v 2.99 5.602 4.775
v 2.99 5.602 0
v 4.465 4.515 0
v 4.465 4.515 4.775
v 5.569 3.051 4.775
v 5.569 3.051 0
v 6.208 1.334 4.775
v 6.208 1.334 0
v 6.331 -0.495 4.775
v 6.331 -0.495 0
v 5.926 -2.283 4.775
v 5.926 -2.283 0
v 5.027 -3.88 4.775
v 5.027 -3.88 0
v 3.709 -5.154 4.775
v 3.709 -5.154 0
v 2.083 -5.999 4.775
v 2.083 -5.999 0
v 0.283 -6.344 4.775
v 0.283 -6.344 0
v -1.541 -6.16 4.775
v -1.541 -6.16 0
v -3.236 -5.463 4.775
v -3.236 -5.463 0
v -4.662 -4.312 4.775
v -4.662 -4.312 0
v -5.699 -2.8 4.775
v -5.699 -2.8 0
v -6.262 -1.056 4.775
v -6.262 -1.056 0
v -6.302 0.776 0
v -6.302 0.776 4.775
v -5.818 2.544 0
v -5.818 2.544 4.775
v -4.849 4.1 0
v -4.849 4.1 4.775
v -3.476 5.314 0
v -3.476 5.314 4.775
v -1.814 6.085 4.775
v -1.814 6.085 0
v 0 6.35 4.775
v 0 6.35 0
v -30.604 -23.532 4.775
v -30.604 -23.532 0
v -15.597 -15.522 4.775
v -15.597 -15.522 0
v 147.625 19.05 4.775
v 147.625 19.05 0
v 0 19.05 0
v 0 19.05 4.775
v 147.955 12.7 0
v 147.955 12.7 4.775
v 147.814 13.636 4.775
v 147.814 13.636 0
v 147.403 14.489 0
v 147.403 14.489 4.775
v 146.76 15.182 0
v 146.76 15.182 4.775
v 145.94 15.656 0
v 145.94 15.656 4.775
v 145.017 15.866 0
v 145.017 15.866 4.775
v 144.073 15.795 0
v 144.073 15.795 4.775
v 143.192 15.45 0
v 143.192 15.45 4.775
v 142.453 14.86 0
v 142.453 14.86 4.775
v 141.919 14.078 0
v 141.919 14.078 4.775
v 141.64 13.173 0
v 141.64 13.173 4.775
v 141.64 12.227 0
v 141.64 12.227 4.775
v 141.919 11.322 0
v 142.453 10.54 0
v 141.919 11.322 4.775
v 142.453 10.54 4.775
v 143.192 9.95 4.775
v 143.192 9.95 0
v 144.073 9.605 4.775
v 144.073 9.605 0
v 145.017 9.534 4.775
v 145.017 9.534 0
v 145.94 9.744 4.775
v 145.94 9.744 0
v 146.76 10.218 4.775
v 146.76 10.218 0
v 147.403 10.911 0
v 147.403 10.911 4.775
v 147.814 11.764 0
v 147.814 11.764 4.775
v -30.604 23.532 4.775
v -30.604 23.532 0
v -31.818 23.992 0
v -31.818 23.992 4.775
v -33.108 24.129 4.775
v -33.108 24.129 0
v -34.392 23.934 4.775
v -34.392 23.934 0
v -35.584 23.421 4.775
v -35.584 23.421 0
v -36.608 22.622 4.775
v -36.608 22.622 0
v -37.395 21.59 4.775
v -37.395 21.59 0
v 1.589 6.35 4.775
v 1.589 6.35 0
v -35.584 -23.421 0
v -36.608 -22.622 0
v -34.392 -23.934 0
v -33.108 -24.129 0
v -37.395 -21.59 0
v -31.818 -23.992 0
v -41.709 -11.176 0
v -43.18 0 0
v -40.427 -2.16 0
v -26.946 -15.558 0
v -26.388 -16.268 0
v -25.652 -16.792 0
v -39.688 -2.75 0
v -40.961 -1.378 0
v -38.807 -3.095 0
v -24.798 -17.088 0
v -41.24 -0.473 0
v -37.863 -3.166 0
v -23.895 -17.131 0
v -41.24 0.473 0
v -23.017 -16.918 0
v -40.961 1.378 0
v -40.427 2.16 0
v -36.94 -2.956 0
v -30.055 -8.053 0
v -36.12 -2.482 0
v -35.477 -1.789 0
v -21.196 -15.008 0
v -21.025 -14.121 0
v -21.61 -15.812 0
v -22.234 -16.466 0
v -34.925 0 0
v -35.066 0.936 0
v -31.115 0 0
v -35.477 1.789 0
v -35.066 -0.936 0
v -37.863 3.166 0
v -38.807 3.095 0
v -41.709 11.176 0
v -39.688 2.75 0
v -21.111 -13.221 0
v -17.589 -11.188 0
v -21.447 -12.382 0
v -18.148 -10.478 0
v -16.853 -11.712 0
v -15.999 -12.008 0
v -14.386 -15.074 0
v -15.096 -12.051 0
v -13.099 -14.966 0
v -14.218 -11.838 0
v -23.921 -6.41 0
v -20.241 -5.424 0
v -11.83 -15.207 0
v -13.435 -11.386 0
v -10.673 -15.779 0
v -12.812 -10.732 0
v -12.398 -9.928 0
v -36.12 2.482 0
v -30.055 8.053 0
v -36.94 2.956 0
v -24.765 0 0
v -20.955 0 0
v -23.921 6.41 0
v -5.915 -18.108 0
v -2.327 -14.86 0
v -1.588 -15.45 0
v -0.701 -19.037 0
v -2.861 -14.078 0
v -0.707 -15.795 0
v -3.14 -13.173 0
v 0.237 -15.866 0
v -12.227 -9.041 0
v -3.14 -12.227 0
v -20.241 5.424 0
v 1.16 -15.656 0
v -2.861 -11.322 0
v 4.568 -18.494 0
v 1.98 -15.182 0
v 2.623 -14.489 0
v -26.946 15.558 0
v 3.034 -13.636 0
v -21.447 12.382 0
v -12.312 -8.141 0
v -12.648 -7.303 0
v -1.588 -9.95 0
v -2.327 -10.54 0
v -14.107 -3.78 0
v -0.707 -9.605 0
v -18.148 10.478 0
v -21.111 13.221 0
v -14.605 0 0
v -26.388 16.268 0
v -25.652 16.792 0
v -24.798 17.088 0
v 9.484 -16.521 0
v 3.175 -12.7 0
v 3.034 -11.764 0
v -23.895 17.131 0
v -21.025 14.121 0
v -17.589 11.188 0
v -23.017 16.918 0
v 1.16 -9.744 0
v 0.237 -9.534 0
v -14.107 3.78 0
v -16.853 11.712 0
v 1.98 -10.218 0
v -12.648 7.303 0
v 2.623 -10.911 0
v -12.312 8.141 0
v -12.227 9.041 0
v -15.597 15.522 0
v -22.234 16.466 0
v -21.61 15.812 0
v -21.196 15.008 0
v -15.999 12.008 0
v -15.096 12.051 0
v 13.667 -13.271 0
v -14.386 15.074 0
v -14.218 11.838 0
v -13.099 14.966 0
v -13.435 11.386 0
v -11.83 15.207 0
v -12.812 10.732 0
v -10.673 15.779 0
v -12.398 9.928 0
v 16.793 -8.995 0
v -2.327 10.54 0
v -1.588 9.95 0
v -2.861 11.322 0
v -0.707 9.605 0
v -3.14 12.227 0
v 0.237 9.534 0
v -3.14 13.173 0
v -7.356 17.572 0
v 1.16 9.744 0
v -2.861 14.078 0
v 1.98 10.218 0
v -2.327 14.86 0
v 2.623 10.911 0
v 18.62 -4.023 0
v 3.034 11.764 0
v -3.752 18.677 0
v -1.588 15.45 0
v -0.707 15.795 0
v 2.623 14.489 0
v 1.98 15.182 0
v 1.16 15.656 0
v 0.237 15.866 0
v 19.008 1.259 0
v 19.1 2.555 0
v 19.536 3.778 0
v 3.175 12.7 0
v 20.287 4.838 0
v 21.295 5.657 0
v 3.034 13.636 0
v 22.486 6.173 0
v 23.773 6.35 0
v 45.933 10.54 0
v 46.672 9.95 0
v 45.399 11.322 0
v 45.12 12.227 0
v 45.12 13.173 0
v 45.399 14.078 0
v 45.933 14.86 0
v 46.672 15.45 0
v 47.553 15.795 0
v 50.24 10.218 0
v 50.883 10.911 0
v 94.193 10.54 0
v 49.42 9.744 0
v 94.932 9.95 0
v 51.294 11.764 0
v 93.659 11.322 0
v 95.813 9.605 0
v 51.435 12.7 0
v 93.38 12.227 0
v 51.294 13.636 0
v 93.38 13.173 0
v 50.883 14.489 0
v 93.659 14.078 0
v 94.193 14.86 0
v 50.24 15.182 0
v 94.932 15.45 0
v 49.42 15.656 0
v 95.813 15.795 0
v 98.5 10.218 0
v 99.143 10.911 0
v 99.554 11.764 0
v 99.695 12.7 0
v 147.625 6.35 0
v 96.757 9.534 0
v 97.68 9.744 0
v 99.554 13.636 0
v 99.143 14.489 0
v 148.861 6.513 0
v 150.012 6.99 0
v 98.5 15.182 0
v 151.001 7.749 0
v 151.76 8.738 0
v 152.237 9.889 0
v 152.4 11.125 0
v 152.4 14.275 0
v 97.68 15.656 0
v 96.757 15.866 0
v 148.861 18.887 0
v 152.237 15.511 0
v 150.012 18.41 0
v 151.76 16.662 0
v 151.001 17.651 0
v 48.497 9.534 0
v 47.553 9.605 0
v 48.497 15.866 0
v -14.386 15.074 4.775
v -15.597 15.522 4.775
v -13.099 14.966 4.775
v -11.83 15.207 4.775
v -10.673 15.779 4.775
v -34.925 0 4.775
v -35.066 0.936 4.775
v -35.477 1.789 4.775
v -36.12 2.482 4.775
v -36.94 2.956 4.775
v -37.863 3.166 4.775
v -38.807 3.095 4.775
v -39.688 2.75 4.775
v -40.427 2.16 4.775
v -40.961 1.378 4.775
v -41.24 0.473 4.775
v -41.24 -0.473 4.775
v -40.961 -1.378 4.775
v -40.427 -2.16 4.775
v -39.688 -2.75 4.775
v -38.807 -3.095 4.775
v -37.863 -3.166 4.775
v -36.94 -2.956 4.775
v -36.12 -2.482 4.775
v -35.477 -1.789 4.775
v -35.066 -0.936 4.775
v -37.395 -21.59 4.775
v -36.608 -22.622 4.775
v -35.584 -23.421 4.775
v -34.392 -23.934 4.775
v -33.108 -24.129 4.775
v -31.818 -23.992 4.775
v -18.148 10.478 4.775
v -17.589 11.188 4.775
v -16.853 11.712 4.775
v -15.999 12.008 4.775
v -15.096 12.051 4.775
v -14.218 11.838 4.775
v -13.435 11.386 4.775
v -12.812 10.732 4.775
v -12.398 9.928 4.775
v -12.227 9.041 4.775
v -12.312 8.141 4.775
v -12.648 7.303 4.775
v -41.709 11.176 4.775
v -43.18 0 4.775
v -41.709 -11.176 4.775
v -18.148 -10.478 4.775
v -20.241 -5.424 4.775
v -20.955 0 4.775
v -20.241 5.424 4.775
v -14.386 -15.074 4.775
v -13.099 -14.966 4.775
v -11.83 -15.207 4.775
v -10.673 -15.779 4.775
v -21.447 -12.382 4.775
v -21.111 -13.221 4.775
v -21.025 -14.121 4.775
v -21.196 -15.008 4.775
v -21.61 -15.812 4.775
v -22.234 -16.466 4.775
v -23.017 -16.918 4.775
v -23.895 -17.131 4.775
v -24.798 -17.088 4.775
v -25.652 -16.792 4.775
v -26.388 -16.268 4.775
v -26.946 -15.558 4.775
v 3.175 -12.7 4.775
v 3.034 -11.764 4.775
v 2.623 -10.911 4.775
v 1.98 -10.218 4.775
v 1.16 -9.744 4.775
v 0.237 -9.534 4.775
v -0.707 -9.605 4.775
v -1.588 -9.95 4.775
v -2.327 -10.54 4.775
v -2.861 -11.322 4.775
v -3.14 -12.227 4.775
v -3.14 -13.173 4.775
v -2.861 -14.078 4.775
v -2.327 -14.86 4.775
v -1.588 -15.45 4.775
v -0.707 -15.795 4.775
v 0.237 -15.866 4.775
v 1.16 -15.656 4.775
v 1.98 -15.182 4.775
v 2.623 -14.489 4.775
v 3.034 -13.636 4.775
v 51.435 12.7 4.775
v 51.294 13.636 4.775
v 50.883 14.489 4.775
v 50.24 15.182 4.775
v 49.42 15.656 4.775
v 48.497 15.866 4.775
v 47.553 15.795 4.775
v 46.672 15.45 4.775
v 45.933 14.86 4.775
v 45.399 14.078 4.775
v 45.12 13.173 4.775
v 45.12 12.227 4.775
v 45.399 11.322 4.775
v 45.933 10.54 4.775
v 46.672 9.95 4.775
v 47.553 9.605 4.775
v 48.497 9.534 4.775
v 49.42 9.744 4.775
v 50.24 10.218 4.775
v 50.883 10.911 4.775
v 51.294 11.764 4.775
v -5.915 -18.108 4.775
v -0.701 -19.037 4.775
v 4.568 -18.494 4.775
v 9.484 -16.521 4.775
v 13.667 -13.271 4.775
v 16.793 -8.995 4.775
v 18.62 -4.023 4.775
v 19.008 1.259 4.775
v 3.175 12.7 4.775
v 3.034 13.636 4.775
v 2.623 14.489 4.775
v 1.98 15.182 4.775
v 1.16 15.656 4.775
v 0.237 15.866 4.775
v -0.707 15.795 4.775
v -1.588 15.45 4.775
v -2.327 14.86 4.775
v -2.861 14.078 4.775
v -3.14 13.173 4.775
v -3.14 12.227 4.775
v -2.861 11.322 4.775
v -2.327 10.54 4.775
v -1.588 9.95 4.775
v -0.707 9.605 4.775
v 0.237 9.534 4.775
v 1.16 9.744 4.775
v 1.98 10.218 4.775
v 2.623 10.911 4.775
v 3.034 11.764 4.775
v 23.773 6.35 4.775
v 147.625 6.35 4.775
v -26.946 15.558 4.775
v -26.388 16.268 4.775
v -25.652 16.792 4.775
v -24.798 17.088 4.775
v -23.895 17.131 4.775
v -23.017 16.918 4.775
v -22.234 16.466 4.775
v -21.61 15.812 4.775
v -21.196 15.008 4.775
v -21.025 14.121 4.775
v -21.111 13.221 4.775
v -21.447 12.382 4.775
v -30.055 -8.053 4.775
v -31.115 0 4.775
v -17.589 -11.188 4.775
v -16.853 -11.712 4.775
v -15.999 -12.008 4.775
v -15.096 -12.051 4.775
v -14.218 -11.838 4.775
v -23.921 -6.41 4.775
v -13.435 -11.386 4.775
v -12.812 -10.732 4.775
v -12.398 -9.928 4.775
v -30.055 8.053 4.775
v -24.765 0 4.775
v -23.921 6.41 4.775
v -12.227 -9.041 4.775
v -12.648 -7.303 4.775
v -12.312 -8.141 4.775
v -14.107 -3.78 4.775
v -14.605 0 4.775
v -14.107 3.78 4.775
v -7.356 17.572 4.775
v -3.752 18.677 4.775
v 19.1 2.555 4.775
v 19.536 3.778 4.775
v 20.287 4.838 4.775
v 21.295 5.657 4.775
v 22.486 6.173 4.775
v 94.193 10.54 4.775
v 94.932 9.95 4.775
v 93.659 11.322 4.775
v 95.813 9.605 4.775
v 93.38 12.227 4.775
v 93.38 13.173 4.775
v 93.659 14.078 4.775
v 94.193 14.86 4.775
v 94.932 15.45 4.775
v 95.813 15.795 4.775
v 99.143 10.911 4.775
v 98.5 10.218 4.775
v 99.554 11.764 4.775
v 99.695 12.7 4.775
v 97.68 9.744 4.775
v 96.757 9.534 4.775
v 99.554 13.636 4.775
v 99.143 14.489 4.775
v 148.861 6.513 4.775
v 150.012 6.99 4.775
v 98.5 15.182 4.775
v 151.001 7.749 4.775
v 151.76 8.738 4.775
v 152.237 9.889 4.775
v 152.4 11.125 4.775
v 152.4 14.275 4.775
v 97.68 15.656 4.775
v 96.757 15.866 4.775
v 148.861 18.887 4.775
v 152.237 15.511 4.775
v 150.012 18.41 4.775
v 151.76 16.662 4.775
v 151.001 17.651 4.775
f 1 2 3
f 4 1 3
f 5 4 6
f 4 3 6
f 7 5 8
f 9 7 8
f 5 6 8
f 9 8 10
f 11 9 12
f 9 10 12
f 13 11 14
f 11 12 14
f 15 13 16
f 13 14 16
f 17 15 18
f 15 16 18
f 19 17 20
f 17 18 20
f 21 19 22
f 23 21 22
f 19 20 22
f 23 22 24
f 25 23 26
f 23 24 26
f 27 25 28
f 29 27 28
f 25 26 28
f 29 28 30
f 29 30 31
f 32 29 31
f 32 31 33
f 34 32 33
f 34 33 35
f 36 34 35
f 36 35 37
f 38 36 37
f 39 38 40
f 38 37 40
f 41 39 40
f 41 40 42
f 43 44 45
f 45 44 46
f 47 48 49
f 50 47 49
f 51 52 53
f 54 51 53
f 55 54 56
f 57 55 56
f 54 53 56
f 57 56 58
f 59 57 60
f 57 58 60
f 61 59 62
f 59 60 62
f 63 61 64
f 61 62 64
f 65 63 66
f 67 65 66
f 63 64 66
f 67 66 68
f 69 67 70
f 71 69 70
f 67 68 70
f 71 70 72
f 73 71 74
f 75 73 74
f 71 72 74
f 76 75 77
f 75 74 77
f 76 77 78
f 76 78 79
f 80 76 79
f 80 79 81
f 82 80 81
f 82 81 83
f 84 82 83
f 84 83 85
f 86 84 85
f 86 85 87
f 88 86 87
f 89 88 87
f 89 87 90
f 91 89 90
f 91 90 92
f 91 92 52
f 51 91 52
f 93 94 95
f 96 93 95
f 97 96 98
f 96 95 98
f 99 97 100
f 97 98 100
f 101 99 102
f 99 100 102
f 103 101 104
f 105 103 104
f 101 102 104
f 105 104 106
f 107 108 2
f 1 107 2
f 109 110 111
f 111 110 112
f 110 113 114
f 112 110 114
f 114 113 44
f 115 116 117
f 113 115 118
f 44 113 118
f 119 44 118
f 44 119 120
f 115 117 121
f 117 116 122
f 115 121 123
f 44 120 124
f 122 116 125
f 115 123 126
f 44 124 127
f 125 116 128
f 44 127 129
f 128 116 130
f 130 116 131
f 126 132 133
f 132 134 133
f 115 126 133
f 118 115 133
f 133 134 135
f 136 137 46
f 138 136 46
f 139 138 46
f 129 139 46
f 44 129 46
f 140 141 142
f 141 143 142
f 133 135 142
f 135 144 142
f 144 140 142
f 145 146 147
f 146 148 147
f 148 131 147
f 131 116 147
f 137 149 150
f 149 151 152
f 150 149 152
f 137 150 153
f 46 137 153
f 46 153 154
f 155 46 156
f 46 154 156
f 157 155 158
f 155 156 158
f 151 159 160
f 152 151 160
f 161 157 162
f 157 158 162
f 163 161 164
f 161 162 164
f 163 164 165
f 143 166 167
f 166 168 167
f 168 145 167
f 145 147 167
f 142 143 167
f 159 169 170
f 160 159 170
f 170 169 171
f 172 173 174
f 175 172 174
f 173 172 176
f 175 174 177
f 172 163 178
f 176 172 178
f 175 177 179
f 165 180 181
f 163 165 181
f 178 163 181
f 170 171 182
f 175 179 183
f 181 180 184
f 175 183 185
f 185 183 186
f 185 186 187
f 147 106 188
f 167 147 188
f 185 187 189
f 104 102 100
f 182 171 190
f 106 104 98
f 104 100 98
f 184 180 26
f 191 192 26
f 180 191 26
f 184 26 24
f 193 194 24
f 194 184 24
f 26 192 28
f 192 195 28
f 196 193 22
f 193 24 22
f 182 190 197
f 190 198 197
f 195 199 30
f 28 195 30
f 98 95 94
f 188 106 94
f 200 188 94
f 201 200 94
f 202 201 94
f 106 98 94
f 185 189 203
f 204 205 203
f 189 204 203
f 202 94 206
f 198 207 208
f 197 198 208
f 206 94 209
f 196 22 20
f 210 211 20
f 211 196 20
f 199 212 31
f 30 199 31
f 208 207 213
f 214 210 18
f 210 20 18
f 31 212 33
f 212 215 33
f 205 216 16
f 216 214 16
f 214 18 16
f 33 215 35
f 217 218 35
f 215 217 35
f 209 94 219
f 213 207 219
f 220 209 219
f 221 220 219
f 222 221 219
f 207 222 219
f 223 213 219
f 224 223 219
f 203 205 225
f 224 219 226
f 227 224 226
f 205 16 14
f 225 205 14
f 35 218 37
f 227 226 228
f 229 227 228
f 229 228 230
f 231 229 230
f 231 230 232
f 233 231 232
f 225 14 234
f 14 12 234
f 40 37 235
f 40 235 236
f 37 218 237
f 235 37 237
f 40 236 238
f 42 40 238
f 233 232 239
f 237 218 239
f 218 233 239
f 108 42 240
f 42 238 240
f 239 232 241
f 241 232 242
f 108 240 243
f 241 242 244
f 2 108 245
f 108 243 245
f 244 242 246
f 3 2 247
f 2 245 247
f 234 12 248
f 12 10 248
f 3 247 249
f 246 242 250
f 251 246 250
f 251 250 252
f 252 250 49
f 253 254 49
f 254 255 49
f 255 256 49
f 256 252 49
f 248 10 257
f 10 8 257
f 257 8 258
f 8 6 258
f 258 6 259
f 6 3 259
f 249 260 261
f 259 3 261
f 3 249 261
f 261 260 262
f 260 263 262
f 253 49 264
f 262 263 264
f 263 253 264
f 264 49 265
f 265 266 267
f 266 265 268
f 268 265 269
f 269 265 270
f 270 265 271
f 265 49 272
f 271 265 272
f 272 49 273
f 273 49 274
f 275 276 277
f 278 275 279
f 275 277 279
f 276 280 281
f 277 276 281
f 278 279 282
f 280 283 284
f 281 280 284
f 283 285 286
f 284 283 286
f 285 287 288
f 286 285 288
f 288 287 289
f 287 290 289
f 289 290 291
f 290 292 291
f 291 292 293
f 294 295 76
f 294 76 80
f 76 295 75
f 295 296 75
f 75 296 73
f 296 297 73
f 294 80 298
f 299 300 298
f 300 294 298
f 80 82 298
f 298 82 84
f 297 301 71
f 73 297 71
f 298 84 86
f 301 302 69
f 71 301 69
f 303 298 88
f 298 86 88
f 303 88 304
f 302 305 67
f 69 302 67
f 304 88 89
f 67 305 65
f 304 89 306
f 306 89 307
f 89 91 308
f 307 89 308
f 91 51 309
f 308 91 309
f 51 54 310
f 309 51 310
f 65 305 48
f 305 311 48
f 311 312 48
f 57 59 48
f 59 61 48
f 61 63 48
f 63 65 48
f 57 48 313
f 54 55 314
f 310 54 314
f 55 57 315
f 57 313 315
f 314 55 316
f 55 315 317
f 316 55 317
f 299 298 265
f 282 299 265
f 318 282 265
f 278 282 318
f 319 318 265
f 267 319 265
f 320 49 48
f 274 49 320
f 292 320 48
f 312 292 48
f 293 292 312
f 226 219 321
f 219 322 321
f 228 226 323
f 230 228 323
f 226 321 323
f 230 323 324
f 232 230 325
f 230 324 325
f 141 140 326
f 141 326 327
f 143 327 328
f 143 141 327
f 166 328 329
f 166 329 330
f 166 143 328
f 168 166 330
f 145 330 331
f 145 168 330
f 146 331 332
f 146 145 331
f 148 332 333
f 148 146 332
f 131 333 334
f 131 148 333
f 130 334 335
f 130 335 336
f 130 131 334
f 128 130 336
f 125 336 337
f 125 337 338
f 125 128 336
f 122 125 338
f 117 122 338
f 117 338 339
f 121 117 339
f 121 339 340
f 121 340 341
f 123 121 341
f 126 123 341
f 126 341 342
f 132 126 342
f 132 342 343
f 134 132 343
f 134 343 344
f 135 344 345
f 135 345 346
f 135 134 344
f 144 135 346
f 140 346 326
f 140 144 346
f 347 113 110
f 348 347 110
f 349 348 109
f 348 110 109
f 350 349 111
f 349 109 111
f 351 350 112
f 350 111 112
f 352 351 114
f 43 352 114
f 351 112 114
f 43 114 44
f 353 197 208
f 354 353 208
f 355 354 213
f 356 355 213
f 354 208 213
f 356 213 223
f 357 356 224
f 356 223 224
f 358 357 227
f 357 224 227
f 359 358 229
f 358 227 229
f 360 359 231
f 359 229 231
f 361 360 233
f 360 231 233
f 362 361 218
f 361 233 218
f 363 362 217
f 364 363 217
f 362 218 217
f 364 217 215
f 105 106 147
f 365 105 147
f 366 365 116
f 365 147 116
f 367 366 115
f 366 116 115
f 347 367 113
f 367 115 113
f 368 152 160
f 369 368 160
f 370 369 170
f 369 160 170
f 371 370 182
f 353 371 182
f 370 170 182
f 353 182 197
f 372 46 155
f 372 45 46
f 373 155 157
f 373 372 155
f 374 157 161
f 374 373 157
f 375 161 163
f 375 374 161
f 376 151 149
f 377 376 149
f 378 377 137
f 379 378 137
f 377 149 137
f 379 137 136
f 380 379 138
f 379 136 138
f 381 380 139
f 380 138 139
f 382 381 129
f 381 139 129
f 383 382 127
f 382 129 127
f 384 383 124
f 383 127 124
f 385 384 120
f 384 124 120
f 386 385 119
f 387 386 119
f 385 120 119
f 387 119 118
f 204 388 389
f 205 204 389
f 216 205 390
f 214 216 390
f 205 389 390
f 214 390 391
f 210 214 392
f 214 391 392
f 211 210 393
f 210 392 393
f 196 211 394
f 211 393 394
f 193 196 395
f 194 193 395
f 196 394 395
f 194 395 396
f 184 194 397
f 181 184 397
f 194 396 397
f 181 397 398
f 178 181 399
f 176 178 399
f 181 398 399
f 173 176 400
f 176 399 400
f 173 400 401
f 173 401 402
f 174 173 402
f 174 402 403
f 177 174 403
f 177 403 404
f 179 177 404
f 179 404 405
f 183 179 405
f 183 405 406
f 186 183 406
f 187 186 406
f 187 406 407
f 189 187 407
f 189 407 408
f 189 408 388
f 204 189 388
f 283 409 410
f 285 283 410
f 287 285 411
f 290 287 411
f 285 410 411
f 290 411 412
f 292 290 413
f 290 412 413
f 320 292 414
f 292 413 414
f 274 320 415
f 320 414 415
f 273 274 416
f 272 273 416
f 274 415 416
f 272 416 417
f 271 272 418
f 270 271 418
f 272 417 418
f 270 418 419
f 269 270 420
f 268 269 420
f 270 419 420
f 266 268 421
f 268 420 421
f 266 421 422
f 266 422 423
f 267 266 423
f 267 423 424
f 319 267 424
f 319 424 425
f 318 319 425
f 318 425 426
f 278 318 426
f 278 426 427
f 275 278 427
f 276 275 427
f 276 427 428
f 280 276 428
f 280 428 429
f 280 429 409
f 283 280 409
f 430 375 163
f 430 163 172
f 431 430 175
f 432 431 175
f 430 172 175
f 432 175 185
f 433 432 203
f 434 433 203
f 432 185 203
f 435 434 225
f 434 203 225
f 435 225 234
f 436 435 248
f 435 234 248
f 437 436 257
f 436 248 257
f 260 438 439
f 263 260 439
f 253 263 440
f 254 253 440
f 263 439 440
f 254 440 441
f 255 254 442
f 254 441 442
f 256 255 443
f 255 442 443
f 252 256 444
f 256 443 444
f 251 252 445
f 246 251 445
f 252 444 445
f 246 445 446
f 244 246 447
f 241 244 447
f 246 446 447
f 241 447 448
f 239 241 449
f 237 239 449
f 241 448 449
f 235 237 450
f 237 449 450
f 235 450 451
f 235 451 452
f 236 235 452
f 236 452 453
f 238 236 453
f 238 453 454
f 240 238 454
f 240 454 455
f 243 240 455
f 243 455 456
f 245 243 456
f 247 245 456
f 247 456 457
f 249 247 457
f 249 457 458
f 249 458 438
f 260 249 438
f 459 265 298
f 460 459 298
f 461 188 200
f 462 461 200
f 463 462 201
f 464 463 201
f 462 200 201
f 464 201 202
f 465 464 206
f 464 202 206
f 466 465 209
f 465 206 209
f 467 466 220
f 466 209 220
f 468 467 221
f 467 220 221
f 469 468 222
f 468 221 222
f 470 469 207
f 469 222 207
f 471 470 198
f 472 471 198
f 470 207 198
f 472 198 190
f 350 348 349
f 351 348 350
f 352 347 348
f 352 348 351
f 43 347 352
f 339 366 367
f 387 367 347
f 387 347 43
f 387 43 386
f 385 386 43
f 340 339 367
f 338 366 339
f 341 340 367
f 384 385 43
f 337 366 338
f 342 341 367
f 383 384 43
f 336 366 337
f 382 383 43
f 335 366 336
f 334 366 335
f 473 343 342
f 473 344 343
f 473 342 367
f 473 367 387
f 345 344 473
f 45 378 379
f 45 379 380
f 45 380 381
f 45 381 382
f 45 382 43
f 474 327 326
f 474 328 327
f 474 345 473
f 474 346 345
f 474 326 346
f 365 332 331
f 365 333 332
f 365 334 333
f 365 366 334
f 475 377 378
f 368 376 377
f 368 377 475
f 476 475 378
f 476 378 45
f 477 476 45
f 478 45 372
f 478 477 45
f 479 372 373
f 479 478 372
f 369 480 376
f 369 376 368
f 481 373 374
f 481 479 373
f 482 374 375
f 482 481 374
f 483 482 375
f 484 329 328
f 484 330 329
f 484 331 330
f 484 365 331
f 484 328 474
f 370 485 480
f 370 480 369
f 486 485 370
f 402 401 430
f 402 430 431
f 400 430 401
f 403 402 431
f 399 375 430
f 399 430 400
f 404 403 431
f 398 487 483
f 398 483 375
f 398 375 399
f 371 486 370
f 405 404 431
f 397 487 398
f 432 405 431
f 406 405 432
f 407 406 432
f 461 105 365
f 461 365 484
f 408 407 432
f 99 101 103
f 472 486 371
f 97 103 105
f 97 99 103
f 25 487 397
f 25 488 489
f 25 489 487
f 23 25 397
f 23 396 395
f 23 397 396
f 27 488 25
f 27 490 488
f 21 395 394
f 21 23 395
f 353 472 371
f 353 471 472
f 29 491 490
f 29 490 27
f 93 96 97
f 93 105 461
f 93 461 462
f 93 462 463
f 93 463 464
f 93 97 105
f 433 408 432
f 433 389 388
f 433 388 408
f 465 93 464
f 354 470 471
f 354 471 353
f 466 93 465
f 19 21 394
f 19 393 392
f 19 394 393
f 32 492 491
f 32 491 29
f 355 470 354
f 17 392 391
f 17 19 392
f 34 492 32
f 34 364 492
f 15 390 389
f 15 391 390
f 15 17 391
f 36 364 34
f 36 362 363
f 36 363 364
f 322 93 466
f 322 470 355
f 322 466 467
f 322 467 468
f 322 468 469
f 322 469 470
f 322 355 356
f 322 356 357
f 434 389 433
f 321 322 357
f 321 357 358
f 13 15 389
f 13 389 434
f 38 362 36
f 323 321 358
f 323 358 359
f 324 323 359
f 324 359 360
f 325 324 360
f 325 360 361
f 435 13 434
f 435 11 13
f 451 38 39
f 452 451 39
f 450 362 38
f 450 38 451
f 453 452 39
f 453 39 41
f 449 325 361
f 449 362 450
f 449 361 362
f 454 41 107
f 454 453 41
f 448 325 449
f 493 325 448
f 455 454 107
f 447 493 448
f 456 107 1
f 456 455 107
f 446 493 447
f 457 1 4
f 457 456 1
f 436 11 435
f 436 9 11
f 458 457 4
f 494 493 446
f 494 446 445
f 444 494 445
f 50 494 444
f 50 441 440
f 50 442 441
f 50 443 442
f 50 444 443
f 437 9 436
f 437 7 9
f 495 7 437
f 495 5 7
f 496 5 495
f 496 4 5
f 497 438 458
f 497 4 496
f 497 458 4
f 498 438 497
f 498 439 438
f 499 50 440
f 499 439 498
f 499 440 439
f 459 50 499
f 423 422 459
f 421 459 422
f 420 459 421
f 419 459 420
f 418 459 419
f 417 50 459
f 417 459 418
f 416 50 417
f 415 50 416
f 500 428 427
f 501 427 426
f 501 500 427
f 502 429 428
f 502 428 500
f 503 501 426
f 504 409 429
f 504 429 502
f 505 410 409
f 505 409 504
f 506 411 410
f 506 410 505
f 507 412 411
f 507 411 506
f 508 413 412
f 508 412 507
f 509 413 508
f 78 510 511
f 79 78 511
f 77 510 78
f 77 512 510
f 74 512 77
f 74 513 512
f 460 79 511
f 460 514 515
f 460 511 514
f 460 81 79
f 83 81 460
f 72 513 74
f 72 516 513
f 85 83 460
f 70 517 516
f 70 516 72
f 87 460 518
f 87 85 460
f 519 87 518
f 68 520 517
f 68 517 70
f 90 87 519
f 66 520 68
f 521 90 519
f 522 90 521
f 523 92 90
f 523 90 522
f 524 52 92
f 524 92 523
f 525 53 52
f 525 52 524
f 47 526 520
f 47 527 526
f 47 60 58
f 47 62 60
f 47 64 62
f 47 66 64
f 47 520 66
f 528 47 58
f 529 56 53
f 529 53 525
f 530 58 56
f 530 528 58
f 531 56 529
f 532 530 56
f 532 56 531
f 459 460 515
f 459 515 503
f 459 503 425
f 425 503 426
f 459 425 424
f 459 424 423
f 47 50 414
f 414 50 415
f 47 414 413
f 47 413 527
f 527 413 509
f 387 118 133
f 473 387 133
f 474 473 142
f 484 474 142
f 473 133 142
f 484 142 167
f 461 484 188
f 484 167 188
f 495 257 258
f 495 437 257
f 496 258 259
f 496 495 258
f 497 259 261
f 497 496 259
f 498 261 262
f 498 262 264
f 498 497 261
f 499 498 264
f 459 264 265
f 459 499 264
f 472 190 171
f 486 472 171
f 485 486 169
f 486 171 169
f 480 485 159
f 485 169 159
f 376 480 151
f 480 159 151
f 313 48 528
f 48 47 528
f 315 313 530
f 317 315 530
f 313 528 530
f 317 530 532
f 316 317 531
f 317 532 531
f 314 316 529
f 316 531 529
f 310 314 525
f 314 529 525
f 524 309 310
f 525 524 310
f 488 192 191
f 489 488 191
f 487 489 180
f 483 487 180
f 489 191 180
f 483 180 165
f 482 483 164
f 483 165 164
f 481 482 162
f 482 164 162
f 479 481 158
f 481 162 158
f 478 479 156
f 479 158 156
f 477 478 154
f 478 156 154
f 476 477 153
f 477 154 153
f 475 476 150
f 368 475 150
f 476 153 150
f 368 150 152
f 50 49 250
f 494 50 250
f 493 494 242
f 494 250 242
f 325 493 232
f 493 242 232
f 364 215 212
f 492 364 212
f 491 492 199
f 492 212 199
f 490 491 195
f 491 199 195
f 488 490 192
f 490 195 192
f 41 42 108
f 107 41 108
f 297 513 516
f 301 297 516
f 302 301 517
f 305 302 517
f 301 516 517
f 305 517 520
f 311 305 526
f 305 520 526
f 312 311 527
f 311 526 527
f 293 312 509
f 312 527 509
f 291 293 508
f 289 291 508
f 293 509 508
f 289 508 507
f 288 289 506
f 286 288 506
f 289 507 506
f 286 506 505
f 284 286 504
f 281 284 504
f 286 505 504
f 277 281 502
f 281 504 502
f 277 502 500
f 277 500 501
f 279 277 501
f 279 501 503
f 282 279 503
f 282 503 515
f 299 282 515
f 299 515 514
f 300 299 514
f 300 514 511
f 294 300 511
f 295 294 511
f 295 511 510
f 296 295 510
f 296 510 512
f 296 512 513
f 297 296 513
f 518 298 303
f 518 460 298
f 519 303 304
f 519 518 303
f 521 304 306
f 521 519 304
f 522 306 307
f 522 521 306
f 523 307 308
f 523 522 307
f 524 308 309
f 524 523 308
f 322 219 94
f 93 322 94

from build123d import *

# Parameters (mm, degrees)
SKETCH1_R           = 3.175
BOSS_EXTRUDE1_DEPTH = 4.7752
FILLET1_R           = 4.7752
SKETCH2_R           = 3.175
CUT_EXTRUDE2_DEPTH  = 12.6492


with BuildPart() as part:
    # Sketch1 → Boss-Extrude1 (new body)
    with BuildSketch(Plane.XY):
        with BuildLine():
            ThreePointArc((-37.394976935, 21.59), (-43.18, 0), (-37.394976935, -21.59))
            ThreePointArc((-37.394976935, -21.59), (-34.391979043, -23.934305056), (-30.603626356, -23.531630922))
            Line((-30.603626356, -23.531630922), (-12.85503117, -14.058829027))
            ThreePointArc((-12.85503117, -14.058829027), (10.51886685, -15.882567179), (17.960512242, 6.35))
            Line((17.960512242, 6.35), (152.4, 6.35))
            Line((152.4, 6.35), (152.4, 19.05))
            Line((152.4, 19.05), (0, 19.05))
            ThreePointArc((0, 19.05), (-6.89499119, 17.758423255), (-12.85503117, 14.058829027))
            Line((-12.85503117, 14.058829027), (-30.603626356, 23.531630922))
            ThreePointArc((-30.603626356, 23.531630922), (-34.391979043, 23.934305056), (-37.394976935, 21.59))
        make_face()
        with BuildLine():
            ThreePointArc((2.98992691, 5.602038653), (-1.541031238, -6.160172297), (0, 6.35))
            Line((0, 6.35), (1.588518614, 6.35))
            Line((1.588518614, 6.35), (2.98992691, 5.602038653))
        make_face(mode=Mode.SUBTRACT)
        with Locations((-38.1, 0)):
            Circle(SKETCH1_R, mode=Mode.SUBTRACT)
        with BuildLine():
            ThreePointArc((-26.946380439, -15.5575), (-31.115, 0), (-26.946380439, 15.5575))
            ThreePointArc((-26.946380439, 15.5575), (-22.609249782, 16.719630657), (-21.447119125, 12.3825))
            ThreePointArc((-21.447119125, 12.3825), (-24.765, 0), (-21.447119125, -12.3825))
            ThreePointArc((-21.447119125, -12.3825), (-22.609249782, -16.719630657), (-26.946380439, -15.5575))
        make_face(mode=Mode.SUBTRACT)
        with BuildLine():
            ThreePointArc((-18.147562336, -10.4775), (-20.955, 0), (-18.147562336, 10.4775))
            ThreePointArc((-18.147562336, 10.4775), (-13.810431679, 11.639630657), (-12.648301022, 7.3025))
            ThreePointArc((-12.648301022, 7.3025), (-14.605, 0), (-12.648301022, -7.3025))
            ThreePointArc((-12.648301022, -7.3025), (-13.810431679, -11.639630657), (-18.147562336, -10.4775))
        make_face(mode=Mode.SUBTRACT)
    extrude(amount=BOSS_EXTRUDE1_DEPTH)

    # Fillet1
    fillet1_edges = [part.edges().sort_by_distance(p)[0] for p in [
        (-12.85503117, 14.058829027, 2.3876),
        (152.4, 19.05, 2.3876),
        (152.4, 6.35, 2.3876),
        (17.960512242, 6.35, 2.3876),
        (-12.85503117, -14.058829027, 2.3876),
    ]]
    fillet(fillet1_edges, radius=FILLET1_R)

    # Sketch2 → Cut-Extrude2 (cut)
    with BuildSketch(Plane.XY.offset(4.7752)):
        with Locations((0, 12.7)):
            Circle(SKETCH2_R)
        with Locations((0, -12.7)):
            Circle(SKETCH2_R)
        with Locations((48.26, 12.7)):
            Circle(SKETCH2_R)
        with Locations((96.52, 12.7)):
            Circle(SKETCH2_R)
        with Locations((144.78, 12.7)):
            Circle(SKETCH2_R)
    extrude(amount=-CUT_EXTRUDE2_DEPTH, mode=Mode.SUBTRACT)


solid = part.part
